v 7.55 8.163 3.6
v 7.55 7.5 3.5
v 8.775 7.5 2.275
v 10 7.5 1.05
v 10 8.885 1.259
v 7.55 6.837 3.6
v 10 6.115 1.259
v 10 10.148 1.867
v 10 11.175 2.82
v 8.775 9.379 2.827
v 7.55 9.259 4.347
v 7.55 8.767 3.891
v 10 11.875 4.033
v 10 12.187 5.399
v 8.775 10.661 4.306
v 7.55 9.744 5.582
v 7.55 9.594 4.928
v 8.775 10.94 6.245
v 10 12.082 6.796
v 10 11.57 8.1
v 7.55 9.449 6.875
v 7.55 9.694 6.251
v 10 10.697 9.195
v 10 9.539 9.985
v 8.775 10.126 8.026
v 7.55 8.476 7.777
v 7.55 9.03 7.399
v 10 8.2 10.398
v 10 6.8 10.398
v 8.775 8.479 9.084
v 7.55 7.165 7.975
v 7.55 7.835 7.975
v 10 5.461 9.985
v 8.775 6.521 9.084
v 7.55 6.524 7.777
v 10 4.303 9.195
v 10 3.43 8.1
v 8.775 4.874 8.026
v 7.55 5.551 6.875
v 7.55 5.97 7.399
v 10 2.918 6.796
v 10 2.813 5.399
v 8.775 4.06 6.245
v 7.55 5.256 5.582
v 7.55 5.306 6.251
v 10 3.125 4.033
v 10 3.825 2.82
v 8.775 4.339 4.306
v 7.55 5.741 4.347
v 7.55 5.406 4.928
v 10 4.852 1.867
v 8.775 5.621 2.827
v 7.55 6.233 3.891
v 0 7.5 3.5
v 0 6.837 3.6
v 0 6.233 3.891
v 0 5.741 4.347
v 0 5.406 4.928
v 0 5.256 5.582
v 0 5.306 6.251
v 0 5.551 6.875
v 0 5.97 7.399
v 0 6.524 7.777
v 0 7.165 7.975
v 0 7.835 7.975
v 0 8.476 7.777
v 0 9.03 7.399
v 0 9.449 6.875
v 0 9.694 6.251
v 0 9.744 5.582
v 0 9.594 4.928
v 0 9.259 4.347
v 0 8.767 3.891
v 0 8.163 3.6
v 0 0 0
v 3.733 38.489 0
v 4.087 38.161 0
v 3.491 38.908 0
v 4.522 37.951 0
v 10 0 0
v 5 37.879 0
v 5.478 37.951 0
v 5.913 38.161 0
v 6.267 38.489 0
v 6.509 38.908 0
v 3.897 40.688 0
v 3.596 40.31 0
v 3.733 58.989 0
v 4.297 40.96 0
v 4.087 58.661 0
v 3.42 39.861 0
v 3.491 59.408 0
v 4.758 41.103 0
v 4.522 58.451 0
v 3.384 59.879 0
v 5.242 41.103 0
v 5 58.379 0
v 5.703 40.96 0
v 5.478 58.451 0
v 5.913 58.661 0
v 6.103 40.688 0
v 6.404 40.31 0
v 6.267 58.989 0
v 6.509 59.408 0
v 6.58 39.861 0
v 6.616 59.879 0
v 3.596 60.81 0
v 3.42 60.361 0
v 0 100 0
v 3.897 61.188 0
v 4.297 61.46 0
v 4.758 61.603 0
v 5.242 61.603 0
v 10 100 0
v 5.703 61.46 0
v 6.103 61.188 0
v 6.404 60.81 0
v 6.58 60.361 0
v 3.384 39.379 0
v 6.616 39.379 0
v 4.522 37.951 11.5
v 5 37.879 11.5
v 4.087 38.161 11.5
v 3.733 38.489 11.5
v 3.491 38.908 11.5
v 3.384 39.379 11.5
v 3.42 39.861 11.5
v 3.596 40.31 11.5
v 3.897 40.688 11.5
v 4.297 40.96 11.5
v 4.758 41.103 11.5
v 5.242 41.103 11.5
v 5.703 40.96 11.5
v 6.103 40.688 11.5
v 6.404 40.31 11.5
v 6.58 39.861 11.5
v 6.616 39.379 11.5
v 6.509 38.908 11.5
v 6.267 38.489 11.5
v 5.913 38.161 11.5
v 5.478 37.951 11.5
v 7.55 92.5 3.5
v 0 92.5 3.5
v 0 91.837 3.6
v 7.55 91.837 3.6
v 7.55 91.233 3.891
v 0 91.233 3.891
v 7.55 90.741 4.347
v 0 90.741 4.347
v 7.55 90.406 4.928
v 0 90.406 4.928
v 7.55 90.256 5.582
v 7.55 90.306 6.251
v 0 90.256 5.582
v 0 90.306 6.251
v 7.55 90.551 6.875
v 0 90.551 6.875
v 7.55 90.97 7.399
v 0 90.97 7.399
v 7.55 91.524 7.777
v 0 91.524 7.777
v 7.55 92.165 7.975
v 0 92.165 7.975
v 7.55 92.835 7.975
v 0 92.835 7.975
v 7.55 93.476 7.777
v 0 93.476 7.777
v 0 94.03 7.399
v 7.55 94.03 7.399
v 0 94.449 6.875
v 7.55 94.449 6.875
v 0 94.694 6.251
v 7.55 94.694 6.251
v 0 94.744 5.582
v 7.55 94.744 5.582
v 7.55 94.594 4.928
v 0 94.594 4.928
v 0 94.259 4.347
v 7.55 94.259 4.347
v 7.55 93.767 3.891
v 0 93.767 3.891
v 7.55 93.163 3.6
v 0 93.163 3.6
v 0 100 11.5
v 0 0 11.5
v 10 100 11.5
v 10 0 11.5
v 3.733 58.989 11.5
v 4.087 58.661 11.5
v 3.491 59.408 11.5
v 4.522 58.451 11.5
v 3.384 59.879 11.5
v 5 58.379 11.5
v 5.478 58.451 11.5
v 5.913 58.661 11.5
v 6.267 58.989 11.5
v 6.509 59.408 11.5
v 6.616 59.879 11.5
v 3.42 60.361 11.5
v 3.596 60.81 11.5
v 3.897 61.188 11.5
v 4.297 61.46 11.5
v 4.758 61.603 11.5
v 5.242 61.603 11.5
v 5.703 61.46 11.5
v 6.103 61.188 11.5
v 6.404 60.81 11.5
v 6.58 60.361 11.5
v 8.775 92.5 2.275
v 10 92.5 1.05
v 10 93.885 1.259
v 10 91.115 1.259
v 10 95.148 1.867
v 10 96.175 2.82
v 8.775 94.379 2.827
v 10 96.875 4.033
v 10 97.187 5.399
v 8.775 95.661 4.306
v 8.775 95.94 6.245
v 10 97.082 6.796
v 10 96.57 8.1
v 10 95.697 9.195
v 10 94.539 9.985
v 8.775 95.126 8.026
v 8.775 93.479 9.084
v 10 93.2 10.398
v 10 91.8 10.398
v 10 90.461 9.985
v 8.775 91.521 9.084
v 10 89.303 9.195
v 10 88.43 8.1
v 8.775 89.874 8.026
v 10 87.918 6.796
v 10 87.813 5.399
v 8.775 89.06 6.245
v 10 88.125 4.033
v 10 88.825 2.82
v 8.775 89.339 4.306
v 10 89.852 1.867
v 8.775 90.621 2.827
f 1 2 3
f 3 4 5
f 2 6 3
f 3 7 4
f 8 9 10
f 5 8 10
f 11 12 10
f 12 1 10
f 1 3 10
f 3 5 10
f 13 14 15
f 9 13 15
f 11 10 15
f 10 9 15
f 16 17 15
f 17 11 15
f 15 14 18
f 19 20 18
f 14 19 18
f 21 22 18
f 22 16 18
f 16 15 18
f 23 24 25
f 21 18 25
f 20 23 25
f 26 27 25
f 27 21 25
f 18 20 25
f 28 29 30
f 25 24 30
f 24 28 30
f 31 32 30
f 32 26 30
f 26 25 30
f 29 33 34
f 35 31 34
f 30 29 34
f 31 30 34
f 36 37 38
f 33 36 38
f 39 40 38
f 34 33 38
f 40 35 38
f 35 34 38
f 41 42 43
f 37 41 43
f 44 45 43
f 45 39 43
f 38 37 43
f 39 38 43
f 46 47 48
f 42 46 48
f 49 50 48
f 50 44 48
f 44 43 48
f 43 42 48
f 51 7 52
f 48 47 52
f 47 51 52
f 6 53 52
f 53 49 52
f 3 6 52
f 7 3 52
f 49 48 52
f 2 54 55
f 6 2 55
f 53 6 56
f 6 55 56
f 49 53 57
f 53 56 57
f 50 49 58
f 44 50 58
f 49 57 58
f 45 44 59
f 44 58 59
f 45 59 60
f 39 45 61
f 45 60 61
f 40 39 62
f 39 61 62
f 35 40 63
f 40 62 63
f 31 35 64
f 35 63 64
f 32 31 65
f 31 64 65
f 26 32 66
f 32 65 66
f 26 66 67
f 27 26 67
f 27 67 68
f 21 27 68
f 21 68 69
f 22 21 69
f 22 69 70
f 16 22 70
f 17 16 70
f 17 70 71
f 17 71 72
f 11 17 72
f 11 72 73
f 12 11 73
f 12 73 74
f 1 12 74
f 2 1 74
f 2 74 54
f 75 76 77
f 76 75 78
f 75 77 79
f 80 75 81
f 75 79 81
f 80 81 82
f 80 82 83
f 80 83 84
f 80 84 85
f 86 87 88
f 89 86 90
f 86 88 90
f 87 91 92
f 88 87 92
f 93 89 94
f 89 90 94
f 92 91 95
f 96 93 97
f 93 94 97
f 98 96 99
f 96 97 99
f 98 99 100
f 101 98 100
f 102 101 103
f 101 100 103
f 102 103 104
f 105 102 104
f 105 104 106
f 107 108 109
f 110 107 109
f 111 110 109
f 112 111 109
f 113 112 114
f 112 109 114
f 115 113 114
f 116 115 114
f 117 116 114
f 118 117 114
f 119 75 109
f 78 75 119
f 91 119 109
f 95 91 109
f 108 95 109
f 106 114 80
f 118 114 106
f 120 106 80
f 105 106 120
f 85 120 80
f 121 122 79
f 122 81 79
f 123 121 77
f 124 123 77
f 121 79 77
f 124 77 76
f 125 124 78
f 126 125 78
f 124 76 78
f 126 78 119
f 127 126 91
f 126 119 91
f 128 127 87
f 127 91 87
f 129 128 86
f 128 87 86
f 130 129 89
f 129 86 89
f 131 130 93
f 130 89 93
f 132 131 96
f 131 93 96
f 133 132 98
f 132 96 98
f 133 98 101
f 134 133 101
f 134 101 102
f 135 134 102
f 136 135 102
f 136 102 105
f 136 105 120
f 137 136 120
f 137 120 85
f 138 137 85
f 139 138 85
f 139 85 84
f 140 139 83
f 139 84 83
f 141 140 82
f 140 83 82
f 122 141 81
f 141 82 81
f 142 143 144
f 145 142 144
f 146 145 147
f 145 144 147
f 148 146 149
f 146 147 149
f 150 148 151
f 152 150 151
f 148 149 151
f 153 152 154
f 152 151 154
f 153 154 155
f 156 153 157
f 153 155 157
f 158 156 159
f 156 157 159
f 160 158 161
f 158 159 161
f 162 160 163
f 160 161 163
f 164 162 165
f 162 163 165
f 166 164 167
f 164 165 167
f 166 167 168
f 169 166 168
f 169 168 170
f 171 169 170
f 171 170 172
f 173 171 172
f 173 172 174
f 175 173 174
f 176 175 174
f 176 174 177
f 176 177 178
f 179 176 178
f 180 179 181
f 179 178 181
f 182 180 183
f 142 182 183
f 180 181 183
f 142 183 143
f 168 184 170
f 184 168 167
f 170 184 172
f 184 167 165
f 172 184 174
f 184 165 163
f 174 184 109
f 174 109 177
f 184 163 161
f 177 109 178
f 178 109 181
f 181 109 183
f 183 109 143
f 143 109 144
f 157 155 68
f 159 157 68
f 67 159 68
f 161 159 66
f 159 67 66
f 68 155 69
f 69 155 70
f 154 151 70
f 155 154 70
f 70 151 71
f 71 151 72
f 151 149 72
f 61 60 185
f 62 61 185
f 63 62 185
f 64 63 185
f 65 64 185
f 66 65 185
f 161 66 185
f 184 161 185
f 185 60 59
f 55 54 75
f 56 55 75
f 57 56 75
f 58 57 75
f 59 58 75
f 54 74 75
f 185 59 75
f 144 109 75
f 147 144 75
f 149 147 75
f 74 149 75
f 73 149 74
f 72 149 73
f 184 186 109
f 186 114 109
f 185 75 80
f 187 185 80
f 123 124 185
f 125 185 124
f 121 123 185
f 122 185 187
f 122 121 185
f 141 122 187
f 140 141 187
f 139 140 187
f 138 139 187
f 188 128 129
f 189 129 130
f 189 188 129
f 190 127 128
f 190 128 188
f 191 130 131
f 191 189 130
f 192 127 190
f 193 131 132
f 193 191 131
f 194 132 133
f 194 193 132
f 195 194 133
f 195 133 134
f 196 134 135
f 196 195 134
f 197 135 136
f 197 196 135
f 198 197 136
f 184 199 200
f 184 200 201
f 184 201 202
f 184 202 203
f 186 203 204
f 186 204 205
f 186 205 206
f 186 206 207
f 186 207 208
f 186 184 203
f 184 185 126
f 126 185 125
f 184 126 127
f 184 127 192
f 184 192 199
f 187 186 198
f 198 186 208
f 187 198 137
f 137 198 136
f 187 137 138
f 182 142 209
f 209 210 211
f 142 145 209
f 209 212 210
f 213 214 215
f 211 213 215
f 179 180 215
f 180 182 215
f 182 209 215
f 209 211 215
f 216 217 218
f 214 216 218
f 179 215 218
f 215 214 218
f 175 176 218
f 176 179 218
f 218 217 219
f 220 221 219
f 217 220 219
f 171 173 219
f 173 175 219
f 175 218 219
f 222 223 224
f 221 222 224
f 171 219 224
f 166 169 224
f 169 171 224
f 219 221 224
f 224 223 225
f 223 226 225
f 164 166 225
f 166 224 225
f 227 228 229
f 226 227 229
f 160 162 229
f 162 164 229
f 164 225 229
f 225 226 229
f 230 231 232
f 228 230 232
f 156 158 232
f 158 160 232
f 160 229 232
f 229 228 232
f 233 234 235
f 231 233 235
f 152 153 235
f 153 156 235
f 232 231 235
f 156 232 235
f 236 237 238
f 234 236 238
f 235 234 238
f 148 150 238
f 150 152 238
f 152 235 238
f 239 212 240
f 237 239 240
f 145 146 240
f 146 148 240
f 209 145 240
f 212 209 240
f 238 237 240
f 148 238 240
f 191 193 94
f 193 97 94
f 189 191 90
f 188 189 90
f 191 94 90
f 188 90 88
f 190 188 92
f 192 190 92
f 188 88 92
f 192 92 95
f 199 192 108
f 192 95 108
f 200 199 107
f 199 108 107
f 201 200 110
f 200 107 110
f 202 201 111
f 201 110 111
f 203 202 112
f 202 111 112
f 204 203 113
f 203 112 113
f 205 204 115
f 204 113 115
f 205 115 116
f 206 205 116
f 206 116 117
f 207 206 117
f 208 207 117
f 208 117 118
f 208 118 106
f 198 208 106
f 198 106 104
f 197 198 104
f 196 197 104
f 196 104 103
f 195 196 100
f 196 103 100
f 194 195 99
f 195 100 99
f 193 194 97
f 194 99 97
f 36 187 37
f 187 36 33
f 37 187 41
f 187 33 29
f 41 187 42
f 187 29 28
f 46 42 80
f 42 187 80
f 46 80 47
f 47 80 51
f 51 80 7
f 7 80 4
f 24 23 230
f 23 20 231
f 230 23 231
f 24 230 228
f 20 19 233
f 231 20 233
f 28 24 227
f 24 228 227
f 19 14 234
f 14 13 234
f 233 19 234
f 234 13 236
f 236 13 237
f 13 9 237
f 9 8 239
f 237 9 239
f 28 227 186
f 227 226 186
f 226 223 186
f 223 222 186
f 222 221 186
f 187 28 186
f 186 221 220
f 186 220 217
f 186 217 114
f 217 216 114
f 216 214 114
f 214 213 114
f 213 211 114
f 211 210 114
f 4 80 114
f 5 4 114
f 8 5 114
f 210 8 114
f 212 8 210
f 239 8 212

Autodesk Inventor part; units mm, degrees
ref_plane "YZ Plane" through (0, 0, 0) normal (1, 0, 0) x (0, 1, 0)
ref_plane "XZ Plane" through (0, 0, 0) normal (0, 1, 0) x (-1, 0, 0)
ref_plane "XY Plane" through (0, 0, 0) normal (0, 0, 1) x (1, 0, 0)
sketch "Sketch1" plane through (0, 0, 0) normal (0, 0, 1) x (1, 0, 0)
  line L0 (0, 0) -> (10, 0)
  line L1 (10, 0) -> (10, 100)
  line L2 (10, 100) -> (0, 100)
  line L3 (0, 100) -> (0, 0)
  dimension "d0" = 10
  dimension "d1" = 100
extrude "Extrusion1" add sketch "Sketch1" along normal blind 11.5
sketch "Sketch2" plane through (0, 0, 11.5) normal (0, 0, 1) x (1, 0, 0)
  line L0 (10, 100) -> (0, 100) projected
  line L1 (0, 0) -> (10, 0) projected
  point P0 (5, 39.5)
  point P1 (5, 60)
  point P2 (5, 100)
  dimension "d4" = 20.5
  dimension "d5" = 40
  dimension "d14" = 39.5
  dimension "d24" = 100
hole "Hole1" at (5, 39.5, 11.5) at (5, 60, 11.5) direction (0, 0, -1) diameter 3.242 end through all thread size "M4x0.7" class "6H" standard "ANSI Metric M Profile"
sketch "Sketch3" plane through (10, 0, 0) normal (1, 0, 0) x (0, 0, -1)
  line L0 (0, 100) -> (-11.5, 100) projected
  line L1 (0, 0) -> (-11.5, 0) projected
  point P0 (-5.75, 92.5)
  point P1 (-5.75, 7.5)
  point P2 (-5.75, 100)
  dimension "d15" = 7.5
  dimension "d16" = 7.5
hole "Hole2" at (10, 92.5, 5.75) at (10, 7.5, 5.75) direction (-1, 0, 0) diameter 4.5 end through all countersink diameter 9.4 countersink angle 90 clearance for "Flat Head Machine Screw" size "M4" standard "Ansi Metric M Profile"
equation "\"d16\" = d15"
properties part number "Pancake_Flexi Pipe Mount" material "Aluminum 6061"
